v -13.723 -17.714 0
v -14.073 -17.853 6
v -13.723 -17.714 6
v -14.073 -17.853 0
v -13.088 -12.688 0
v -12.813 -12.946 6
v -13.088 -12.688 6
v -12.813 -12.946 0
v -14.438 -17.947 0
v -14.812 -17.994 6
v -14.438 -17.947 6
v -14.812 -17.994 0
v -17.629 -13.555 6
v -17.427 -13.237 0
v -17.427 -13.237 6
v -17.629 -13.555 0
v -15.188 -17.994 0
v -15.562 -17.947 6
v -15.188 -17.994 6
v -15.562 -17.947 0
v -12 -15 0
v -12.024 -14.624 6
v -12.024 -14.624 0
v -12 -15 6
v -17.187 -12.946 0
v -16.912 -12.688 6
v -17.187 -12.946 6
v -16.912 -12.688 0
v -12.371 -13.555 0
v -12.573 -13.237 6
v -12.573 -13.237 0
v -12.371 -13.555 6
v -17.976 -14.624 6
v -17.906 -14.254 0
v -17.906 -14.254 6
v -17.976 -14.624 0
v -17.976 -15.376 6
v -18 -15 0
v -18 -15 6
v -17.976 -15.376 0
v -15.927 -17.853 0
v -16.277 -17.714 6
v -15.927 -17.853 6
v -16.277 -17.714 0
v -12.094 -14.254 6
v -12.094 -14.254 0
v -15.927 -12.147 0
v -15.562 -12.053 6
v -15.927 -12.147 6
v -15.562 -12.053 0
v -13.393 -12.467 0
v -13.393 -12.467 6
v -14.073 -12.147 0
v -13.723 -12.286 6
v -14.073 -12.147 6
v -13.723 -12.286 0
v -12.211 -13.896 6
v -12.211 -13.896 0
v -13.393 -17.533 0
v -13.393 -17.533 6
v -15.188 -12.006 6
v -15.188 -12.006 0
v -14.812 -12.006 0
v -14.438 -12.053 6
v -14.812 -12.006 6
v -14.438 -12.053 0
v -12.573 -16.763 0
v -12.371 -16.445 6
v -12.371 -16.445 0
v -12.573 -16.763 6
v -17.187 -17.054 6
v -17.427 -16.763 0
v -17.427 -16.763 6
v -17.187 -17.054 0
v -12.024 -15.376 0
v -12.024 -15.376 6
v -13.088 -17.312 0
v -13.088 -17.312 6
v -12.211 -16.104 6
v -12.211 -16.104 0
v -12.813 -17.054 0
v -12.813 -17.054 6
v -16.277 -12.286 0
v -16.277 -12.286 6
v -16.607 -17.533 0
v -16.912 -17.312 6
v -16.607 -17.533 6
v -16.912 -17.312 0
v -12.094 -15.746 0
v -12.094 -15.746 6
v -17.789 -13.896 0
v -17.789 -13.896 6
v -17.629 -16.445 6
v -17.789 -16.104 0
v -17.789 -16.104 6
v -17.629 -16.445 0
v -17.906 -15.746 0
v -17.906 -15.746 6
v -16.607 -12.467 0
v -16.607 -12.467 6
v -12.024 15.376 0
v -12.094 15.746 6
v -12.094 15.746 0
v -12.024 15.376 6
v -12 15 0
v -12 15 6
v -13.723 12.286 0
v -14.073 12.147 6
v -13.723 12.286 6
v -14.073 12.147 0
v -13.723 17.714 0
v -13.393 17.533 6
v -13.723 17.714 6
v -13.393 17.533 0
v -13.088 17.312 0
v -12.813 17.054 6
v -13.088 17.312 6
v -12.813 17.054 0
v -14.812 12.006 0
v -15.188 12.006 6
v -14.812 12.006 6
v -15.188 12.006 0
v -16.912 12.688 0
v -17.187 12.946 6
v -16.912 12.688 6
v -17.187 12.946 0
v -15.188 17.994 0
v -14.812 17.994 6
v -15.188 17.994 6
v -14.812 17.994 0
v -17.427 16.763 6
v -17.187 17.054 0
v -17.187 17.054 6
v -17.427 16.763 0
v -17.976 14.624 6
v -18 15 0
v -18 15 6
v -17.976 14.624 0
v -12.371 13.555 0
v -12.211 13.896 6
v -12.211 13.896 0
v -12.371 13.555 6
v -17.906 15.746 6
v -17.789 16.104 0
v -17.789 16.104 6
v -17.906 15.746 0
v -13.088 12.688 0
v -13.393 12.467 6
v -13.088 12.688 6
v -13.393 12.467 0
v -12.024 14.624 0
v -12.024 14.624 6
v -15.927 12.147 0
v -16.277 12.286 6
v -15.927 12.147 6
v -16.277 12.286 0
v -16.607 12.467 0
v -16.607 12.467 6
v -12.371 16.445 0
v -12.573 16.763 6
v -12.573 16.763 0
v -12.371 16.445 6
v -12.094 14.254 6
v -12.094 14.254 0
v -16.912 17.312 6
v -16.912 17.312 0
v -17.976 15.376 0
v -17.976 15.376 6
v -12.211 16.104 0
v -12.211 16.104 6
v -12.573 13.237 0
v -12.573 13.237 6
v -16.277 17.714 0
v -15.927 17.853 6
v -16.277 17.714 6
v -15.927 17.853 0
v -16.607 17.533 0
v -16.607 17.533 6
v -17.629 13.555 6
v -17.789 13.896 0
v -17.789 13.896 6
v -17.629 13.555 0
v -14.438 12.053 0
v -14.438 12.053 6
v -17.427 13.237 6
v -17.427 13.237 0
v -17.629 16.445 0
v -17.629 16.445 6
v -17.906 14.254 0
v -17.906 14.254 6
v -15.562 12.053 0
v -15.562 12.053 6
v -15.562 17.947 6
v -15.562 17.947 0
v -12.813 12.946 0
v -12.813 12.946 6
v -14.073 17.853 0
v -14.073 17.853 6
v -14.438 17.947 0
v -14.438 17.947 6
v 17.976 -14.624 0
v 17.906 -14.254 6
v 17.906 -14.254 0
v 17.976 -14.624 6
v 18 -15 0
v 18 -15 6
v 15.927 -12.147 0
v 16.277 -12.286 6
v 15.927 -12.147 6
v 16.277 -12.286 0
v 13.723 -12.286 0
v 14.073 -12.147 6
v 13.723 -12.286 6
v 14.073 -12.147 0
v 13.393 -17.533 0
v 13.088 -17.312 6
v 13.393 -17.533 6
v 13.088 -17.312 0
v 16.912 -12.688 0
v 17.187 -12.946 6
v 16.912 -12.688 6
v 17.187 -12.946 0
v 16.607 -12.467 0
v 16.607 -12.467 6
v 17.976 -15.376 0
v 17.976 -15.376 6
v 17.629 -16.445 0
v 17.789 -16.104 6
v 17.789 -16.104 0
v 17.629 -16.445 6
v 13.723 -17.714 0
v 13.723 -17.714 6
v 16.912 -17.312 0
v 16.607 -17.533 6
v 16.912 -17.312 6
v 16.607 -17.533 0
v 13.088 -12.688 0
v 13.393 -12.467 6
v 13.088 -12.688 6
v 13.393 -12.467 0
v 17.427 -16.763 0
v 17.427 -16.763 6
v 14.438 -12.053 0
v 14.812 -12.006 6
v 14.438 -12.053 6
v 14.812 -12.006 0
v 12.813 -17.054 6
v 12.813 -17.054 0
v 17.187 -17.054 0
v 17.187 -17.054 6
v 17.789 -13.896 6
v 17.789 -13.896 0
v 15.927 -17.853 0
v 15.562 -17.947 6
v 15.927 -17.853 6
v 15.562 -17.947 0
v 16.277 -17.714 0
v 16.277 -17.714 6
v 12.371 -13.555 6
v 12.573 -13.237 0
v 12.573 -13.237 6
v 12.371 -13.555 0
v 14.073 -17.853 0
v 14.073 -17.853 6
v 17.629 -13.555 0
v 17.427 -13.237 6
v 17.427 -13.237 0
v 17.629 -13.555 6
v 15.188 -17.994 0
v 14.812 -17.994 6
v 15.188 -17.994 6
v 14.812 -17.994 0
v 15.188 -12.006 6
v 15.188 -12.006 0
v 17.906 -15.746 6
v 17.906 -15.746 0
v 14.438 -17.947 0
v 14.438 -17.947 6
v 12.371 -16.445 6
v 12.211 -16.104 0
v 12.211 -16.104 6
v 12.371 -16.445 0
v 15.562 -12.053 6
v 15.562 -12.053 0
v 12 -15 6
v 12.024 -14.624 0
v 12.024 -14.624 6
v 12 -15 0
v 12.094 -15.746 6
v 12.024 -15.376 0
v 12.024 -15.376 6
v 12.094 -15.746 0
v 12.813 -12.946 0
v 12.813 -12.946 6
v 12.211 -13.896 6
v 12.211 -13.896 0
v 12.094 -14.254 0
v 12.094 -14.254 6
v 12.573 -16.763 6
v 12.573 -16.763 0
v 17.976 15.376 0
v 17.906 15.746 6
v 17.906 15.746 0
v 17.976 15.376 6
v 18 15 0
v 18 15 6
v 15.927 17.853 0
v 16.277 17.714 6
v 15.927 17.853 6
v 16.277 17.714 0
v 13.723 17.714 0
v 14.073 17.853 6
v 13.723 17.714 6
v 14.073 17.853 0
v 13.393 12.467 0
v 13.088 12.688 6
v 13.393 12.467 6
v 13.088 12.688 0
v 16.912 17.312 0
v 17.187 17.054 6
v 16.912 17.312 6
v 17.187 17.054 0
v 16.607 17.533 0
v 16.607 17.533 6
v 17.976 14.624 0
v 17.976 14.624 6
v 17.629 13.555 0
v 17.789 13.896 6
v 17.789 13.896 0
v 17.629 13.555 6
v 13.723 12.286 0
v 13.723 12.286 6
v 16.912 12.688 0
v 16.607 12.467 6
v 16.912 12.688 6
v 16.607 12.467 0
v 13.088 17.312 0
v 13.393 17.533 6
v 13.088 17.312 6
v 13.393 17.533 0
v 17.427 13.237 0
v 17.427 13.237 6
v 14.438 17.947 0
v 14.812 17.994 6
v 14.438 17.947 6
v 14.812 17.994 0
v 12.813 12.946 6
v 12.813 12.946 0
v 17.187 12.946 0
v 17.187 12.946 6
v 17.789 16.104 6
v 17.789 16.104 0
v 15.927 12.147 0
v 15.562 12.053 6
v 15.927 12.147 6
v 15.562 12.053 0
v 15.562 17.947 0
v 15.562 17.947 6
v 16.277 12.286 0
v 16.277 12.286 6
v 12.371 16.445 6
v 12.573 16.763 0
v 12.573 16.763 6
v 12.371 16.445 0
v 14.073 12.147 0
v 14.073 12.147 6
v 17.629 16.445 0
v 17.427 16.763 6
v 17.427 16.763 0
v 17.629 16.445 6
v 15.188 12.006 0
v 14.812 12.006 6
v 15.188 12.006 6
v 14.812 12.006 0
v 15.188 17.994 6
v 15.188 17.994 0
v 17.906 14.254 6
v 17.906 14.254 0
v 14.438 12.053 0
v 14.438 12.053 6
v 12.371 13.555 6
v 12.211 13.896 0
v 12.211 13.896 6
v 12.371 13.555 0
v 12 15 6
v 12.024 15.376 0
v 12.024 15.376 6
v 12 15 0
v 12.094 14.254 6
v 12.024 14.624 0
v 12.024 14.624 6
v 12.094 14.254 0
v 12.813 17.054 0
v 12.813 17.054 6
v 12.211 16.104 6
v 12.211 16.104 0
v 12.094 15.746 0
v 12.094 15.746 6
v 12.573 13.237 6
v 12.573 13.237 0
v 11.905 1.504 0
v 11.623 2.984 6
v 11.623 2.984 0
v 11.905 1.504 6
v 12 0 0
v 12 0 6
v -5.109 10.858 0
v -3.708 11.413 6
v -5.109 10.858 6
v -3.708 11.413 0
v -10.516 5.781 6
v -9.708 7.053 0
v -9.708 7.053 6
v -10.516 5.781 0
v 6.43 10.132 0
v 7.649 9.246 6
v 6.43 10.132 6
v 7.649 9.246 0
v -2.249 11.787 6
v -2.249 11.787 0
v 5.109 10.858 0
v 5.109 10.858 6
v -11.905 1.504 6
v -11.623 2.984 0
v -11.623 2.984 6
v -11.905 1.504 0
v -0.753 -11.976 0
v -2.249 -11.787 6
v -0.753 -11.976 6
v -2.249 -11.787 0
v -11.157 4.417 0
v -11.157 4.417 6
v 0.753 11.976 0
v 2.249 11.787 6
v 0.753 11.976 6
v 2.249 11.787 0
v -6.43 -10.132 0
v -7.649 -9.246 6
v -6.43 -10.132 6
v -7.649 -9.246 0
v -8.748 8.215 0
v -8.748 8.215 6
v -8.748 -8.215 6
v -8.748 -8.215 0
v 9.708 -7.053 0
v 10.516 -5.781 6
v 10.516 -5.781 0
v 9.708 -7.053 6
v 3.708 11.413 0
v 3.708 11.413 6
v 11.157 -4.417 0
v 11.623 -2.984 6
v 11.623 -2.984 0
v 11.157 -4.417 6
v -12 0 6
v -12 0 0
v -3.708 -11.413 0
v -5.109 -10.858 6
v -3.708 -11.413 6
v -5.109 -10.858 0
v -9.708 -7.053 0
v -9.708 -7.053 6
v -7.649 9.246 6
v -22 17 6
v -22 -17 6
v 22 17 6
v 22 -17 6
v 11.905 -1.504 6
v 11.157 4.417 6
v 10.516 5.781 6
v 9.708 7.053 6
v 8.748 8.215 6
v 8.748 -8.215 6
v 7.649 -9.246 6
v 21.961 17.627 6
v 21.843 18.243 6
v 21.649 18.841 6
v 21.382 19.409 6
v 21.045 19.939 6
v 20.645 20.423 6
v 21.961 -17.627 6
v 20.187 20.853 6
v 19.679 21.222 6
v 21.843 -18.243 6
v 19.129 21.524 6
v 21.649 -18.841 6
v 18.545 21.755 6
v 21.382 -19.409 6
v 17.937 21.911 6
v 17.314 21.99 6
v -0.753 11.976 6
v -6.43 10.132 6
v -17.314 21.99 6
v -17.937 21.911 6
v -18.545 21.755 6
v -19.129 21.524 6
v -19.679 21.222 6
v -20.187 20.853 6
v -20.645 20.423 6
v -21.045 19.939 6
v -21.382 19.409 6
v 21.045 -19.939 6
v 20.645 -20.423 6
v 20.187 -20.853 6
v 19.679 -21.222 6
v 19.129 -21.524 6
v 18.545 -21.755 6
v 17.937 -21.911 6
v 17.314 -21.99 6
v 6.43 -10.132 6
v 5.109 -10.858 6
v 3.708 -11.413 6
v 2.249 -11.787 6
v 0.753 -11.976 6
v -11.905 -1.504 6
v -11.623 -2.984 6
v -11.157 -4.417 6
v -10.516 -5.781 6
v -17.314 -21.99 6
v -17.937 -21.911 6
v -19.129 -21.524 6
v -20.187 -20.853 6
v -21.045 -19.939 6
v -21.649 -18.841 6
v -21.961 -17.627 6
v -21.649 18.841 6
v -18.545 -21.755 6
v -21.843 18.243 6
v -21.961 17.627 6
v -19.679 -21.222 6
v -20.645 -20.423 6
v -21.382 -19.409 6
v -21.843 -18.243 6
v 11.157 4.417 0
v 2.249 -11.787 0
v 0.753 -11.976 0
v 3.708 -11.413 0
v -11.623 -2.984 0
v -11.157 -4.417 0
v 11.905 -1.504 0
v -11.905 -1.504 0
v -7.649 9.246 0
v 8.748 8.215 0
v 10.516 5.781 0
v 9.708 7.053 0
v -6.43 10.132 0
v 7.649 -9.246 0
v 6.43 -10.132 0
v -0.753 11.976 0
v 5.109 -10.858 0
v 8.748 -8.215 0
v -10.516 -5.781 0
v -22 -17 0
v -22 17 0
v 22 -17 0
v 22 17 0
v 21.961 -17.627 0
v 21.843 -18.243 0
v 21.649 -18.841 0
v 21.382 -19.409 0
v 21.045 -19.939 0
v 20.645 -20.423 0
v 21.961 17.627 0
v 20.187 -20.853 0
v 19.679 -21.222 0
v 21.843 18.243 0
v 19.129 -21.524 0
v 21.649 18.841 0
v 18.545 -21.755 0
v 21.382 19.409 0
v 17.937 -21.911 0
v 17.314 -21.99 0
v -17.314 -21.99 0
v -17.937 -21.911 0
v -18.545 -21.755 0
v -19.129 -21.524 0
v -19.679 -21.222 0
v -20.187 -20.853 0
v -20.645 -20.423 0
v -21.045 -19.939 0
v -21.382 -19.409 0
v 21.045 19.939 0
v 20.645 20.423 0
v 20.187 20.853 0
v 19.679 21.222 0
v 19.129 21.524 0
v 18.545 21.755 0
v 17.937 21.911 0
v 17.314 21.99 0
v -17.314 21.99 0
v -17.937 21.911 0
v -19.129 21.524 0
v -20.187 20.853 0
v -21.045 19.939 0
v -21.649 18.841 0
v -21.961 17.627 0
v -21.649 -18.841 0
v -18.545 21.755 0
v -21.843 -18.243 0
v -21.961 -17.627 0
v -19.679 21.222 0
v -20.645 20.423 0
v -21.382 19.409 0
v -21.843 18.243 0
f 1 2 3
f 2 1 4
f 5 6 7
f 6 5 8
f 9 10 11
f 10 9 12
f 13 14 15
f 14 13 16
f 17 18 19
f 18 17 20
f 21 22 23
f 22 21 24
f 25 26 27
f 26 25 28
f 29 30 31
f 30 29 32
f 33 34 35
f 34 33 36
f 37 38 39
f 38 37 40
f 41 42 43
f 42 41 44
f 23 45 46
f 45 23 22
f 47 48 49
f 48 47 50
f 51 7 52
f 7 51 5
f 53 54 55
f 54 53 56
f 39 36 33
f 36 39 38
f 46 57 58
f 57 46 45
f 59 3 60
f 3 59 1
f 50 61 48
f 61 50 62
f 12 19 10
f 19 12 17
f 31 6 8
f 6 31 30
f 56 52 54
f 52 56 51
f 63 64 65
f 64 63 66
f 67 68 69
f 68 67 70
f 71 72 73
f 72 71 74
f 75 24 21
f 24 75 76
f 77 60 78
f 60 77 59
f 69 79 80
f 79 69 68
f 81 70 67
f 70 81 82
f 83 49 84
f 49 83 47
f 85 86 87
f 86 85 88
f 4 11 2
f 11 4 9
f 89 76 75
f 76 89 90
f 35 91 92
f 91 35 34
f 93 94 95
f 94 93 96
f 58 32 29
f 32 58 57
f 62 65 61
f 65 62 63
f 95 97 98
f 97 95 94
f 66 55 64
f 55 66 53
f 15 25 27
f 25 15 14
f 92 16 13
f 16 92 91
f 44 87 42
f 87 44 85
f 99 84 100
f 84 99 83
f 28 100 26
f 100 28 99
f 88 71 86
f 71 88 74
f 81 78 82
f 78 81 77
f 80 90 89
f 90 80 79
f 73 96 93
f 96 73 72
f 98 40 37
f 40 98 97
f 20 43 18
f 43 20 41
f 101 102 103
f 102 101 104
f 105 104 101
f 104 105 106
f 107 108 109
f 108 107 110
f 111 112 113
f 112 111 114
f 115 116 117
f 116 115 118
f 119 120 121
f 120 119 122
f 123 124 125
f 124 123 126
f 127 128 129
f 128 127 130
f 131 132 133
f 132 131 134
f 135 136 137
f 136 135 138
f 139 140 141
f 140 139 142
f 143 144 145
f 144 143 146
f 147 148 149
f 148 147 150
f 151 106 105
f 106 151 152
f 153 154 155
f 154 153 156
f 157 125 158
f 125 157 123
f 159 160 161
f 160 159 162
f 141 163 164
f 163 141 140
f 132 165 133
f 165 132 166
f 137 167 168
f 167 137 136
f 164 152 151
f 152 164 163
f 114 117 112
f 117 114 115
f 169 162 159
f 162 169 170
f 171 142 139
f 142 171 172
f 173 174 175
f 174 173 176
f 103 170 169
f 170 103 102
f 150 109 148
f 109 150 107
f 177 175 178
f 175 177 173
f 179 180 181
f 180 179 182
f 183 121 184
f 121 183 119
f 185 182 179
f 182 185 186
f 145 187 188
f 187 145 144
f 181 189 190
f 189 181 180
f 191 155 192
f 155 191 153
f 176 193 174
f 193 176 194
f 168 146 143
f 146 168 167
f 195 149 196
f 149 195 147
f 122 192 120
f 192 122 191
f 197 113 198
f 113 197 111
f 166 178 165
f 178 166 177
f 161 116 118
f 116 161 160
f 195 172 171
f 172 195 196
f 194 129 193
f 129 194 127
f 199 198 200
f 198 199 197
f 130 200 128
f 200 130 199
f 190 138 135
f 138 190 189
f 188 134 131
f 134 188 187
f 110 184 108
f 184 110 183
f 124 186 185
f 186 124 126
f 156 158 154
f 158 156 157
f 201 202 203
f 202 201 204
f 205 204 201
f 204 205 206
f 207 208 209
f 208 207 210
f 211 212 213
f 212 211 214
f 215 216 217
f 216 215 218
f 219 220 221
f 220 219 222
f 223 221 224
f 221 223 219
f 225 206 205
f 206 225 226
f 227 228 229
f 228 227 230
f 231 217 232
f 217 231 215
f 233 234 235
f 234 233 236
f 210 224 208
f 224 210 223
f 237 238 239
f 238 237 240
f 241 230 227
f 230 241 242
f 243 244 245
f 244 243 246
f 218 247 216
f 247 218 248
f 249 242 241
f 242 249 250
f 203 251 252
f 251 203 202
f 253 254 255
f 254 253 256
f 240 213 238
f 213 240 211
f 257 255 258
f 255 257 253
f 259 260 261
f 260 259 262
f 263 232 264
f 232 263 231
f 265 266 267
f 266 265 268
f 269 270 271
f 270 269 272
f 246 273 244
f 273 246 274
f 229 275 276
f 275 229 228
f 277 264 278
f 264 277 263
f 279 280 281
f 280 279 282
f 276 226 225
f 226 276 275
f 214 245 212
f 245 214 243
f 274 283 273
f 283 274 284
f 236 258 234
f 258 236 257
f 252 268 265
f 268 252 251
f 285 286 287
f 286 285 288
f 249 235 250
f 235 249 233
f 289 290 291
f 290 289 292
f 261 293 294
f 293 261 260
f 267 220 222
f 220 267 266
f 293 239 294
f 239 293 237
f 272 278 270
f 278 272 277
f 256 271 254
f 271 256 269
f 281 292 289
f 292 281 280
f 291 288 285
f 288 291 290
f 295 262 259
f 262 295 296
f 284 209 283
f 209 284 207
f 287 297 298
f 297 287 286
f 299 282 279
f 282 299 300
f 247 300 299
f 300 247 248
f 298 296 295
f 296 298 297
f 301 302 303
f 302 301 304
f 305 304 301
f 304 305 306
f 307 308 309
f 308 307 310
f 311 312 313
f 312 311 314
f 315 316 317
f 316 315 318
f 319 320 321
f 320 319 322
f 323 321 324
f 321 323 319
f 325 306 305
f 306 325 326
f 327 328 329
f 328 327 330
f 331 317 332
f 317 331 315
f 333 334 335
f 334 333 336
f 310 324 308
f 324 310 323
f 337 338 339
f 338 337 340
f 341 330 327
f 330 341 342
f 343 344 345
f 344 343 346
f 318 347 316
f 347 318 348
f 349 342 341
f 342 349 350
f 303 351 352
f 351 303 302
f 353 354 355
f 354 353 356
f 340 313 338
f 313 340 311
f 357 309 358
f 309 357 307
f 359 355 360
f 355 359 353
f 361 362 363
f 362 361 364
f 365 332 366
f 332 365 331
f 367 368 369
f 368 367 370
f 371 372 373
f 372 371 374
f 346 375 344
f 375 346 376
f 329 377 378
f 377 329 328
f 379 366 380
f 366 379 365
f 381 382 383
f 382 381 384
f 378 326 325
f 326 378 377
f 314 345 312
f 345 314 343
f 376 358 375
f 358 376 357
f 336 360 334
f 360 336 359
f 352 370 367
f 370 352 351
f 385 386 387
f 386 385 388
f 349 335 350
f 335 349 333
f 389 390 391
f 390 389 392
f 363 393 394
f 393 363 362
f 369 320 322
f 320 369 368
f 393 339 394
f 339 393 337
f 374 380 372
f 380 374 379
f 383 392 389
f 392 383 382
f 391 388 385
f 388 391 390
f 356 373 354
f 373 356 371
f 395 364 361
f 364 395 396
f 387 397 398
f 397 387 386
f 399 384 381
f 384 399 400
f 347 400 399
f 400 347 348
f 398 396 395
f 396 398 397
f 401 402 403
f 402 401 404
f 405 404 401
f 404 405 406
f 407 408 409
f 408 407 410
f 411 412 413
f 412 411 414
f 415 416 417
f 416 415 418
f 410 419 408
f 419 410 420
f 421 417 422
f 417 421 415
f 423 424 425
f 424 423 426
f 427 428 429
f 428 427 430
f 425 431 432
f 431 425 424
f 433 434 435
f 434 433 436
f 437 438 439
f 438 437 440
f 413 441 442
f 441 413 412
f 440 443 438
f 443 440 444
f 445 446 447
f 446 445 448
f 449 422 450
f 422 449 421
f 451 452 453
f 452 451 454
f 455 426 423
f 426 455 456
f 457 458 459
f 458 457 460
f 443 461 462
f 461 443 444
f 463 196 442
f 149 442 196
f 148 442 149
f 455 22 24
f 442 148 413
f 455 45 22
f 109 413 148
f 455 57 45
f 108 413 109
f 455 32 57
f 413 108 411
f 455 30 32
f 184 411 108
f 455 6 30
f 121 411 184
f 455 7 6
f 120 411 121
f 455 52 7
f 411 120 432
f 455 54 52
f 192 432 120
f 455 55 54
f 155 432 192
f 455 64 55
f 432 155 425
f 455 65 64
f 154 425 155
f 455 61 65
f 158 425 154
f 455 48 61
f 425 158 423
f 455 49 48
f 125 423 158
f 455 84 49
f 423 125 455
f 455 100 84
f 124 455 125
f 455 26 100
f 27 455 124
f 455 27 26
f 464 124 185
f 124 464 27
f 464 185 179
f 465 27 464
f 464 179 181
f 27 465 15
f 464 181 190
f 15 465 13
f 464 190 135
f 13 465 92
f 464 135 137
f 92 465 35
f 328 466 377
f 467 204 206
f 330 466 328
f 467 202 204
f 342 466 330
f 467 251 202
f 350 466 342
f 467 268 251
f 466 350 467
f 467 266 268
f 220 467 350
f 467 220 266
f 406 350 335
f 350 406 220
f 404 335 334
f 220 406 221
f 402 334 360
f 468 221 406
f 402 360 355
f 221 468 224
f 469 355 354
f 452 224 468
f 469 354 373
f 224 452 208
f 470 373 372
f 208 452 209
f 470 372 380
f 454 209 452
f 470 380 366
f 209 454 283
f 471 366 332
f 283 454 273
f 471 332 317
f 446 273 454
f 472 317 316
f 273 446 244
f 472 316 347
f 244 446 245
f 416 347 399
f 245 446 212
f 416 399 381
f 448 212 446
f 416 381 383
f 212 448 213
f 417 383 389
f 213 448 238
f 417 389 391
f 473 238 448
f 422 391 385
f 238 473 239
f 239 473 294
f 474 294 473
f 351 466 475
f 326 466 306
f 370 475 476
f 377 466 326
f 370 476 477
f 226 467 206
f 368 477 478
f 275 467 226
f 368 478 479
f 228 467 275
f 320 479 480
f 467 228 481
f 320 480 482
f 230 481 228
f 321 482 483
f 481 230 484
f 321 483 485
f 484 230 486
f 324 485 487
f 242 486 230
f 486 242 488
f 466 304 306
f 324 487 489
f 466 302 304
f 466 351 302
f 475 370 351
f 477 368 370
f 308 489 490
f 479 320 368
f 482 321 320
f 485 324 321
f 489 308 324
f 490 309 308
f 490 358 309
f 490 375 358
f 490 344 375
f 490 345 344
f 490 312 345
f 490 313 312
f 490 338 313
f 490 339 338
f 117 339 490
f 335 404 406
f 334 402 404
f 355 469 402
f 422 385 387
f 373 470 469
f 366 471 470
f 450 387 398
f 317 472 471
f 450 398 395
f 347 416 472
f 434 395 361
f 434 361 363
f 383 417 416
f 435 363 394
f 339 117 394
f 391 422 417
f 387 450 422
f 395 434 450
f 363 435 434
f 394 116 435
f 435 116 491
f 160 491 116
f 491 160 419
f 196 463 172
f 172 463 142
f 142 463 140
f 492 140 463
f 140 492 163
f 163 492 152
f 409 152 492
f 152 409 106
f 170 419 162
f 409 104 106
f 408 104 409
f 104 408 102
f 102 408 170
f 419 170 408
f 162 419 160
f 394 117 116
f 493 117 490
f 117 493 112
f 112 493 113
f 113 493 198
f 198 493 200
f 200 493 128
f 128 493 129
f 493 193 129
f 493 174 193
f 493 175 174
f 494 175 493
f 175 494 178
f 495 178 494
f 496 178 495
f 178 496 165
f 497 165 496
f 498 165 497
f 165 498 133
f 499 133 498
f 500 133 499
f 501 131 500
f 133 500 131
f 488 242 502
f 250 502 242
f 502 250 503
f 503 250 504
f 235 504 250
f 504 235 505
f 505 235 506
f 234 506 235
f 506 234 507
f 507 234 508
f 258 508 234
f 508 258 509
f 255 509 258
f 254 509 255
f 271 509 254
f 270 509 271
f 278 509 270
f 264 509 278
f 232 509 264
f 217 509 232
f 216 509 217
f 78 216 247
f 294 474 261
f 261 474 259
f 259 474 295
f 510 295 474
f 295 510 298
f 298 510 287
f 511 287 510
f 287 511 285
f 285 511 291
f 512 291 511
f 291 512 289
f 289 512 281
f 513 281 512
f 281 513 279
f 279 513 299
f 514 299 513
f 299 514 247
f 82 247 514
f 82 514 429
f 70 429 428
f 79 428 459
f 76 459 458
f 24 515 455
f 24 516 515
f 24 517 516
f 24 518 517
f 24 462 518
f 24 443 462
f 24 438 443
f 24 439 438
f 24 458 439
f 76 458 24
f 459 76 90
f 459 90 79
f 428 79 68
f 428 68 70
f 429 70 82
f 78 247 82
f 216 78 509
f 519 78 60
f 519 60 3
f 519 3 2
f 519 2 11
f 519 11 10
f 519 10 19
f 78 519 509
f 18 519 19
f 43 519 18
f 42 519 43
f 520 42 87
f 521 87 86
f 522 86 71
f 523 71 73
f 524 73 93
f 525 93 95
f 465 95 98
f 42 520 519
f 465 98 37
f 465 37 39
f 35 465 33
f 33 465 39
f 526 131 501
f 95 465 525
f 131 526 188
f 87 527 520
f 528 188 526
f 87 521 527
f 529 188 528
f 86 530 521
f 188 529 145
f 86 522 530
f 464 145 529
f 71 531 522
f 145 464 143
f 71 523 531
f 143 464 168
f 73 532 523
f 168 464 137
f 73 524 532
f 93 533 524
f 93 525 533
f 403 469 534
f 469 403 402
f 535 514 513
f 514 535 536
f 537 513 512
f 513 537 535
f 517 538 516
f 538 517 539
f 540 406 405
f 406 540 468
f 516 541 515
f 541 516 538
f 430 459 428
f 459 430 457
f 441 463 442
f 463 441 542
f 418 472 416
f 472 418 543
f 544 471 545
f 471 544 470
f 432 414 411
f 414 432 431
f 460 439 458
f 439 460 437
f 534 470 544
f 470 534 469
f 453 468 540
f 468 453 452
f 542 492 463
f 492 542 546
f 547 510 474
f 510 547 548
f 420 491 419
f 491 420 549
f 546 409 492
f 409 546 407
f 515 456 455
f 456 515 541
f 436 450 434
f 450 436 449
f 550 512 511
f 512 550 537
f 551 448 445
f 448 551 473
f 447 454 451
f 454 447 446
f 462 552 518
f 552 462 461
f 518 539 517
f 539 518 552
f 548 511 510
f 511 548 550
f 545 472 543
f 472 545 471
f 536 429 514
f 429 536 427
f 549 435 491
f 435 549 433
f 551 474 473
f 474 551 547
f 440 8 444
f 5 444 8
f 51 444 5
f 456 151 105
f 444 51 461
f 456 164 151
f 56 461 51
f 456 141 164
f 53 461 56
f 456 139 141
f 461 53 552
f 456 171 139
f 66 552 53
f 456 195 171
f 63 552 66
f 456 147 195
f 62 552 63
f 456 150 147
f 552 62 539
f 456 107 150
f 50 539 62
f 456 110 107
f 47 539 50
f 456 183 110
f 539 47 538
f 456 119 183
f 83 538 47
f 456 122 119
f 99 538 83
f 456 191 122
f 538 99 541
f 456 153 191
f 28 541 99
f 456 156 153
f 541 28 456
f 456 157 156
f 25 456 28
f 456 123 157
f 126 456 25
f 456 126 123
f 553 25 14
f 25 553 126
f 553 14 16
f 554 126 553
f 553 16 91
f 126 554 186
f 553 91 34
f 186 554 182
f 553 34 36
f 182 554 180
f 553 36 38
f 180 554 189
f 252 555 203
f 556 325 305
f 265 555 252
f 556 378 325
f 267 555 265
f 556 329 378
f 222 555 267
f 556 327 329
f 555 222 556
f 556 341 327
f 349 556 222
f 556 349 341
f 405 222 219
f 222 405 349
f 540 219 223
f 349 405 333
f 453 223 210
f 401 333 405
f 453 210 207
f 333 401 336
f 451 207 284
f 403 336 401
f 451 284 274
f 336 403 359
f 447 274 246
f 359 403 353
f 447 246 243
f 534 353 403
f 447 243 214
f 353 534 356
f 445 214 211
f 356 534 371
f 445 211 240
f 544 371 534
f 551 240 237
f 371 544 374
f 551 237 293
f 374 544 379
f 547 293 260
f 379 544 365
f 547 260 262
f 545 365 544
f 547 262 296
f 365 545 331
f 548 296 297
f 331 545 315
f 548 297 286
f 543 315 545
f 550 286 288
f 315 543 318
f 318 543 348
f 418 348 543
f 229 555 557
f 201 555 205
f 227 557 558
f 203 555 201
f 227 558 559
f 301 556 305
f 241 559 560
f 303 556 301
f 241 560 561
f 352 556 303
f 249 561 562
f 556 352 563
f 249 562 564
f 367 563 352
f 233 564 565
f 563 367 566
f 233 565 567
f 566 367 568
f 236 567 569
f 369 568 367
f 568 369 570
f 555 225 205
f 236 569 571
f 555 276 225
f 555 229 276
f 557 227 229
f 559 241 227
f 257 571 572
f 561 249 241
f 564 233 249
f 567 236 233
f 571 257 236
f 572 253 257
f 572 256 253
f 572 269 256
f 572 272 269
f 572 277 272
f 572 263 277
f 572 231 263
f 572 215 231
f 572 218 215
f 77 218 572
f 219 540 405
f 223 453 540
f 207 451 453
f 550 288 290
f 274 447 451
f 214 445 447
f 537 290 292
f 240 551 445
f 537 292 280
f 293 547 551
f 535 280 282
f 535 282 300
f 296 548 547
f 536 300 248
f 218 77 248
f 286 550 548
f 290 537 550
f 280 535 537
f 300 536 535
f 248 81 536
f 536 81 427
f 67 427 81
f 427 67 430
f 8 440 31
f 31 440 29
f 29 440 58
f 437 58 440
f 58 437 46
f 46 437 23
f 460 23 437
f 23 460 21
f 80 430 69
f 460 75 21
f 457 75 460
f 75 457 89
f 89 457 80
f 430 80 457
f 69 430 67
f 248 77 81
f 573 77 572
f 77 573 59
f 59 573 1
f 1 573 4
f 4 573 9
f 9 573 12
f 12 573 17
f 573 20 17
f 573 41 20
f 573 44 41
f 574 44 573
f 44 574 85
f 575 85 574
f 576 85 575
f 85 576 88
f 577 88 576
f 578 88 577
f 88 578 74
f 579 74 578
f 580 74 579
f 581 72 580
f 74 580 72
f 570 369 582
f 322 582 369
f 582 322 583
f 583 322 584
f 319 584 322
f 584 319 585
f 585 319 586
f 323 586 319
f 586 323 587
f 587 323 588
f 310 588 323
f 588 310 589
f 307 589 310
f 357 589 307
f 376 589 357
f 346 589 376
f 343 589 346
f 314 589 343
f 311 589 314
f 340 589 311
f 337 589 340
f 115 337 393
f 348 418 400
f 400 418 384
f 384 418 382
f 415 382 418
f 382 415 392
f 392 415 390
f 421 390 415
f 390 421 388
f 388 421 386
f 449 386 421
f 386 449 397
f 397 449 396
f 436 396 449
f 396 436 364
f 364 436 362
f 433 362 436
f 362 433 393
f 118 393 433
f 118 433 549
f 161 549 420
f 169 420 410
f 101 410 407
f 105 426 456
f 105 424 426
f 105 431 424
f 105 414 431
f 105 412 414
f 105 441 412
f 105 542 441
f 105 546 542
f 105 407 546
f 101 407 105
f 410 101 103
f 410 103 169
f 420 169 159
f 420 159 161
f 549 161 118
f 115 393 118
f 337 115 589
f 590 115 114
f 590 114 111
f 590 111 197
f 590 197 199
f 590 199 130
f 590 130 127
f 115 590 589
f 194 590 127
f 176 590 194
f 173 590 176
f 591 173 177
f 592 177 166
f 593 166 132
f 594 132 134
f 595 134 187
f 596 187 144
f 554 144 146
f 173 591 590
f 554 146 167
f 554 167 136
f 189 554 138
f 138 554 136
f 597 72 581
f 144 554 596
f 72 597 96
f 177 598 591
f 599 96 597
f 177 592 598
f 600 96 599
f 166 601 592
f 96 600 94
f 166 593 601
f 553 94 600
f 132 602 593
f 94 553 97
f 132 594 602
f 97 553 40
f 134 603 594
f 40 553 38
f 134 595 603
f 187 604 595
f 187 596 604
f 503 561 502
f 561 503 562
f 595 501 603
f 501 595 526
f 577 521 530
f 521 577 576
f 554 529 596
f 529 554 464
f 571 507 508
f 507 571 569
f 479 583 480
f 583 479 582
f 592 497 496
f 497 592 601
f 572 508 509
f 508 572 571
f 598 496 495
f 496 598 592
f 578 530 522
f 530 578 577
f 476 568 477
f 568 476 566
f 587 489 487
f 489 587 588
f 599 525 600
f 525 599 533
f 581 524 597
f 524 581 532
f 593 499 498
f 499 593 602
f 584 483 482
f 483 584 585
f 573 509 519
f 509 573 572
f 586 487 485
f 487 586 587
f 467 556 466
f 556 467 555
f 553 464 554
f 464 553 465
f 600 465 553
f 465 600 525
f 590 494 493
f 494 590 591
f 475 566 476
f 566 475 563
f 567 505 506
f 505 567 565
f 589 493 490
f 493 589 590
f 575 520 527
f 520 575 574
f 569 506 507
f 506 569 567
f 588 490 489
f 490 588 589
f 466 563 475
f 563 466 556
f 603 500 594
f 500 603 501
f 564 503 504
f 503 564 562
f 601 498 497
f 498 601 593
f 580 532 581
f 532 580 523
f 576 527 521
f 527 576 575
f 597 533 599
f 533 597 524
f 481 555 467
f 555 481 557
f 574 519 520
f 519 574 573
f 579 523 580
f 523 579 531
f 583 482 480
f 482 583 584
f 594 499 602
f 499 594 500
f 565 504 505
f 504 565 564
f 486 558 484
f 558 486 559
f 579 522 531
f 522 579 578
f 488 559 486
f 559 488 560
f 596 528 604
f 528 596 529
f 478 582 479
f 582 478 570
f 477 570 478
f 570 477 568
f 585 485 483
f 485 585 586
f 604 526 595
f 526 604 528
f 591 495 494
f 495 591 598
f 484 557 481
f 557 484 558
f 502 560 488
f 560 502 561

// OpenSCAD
$fn = 50;


difference() {
	union() {
		hull() {
			translate(v = [-17.0000000000, 17.0000000000, 0]) {
				cylinder(h = 6, r = 5);
			}
			translate(v = [17.0000000000, 17.0000000000, 0]) {
				cylinder(h = 6, r = 5);
			}
			translate(v = [-17.0000000000, -17.0000000000, 0]) {
				cylinder(h = 6, r = 5);
			}
			translate(v = [17.0000000000, -17.0000000000, 0]) {
				cylinder(h = 6, r = 5);
			}
		}
	}
	union() {
		#translate(v = [-15.0000000000, -15.0000000000, -100.0000000000]) {
			cylinder(h = 200, r = 3.0000000000);
		}
		#translate(v = [-15.0000000000, 15.0000000000, -100.0000000000]) {
			cylinder(h = 200, r = 3.0000000000);
		}
		#translate(v = [15.0000000000, -15.0000000000, -100.0000000000]) {
			cylinder(h = 200, r = 3.0000000000);
		}
		#translate(v = [15.0000000000, 15.0000000000, -100.0000000000]) {
			cylinder(h = 200, r = 3.0000000000);
		}
		#cylinder(h = 6, r = 12.0000000000);
	}
}
